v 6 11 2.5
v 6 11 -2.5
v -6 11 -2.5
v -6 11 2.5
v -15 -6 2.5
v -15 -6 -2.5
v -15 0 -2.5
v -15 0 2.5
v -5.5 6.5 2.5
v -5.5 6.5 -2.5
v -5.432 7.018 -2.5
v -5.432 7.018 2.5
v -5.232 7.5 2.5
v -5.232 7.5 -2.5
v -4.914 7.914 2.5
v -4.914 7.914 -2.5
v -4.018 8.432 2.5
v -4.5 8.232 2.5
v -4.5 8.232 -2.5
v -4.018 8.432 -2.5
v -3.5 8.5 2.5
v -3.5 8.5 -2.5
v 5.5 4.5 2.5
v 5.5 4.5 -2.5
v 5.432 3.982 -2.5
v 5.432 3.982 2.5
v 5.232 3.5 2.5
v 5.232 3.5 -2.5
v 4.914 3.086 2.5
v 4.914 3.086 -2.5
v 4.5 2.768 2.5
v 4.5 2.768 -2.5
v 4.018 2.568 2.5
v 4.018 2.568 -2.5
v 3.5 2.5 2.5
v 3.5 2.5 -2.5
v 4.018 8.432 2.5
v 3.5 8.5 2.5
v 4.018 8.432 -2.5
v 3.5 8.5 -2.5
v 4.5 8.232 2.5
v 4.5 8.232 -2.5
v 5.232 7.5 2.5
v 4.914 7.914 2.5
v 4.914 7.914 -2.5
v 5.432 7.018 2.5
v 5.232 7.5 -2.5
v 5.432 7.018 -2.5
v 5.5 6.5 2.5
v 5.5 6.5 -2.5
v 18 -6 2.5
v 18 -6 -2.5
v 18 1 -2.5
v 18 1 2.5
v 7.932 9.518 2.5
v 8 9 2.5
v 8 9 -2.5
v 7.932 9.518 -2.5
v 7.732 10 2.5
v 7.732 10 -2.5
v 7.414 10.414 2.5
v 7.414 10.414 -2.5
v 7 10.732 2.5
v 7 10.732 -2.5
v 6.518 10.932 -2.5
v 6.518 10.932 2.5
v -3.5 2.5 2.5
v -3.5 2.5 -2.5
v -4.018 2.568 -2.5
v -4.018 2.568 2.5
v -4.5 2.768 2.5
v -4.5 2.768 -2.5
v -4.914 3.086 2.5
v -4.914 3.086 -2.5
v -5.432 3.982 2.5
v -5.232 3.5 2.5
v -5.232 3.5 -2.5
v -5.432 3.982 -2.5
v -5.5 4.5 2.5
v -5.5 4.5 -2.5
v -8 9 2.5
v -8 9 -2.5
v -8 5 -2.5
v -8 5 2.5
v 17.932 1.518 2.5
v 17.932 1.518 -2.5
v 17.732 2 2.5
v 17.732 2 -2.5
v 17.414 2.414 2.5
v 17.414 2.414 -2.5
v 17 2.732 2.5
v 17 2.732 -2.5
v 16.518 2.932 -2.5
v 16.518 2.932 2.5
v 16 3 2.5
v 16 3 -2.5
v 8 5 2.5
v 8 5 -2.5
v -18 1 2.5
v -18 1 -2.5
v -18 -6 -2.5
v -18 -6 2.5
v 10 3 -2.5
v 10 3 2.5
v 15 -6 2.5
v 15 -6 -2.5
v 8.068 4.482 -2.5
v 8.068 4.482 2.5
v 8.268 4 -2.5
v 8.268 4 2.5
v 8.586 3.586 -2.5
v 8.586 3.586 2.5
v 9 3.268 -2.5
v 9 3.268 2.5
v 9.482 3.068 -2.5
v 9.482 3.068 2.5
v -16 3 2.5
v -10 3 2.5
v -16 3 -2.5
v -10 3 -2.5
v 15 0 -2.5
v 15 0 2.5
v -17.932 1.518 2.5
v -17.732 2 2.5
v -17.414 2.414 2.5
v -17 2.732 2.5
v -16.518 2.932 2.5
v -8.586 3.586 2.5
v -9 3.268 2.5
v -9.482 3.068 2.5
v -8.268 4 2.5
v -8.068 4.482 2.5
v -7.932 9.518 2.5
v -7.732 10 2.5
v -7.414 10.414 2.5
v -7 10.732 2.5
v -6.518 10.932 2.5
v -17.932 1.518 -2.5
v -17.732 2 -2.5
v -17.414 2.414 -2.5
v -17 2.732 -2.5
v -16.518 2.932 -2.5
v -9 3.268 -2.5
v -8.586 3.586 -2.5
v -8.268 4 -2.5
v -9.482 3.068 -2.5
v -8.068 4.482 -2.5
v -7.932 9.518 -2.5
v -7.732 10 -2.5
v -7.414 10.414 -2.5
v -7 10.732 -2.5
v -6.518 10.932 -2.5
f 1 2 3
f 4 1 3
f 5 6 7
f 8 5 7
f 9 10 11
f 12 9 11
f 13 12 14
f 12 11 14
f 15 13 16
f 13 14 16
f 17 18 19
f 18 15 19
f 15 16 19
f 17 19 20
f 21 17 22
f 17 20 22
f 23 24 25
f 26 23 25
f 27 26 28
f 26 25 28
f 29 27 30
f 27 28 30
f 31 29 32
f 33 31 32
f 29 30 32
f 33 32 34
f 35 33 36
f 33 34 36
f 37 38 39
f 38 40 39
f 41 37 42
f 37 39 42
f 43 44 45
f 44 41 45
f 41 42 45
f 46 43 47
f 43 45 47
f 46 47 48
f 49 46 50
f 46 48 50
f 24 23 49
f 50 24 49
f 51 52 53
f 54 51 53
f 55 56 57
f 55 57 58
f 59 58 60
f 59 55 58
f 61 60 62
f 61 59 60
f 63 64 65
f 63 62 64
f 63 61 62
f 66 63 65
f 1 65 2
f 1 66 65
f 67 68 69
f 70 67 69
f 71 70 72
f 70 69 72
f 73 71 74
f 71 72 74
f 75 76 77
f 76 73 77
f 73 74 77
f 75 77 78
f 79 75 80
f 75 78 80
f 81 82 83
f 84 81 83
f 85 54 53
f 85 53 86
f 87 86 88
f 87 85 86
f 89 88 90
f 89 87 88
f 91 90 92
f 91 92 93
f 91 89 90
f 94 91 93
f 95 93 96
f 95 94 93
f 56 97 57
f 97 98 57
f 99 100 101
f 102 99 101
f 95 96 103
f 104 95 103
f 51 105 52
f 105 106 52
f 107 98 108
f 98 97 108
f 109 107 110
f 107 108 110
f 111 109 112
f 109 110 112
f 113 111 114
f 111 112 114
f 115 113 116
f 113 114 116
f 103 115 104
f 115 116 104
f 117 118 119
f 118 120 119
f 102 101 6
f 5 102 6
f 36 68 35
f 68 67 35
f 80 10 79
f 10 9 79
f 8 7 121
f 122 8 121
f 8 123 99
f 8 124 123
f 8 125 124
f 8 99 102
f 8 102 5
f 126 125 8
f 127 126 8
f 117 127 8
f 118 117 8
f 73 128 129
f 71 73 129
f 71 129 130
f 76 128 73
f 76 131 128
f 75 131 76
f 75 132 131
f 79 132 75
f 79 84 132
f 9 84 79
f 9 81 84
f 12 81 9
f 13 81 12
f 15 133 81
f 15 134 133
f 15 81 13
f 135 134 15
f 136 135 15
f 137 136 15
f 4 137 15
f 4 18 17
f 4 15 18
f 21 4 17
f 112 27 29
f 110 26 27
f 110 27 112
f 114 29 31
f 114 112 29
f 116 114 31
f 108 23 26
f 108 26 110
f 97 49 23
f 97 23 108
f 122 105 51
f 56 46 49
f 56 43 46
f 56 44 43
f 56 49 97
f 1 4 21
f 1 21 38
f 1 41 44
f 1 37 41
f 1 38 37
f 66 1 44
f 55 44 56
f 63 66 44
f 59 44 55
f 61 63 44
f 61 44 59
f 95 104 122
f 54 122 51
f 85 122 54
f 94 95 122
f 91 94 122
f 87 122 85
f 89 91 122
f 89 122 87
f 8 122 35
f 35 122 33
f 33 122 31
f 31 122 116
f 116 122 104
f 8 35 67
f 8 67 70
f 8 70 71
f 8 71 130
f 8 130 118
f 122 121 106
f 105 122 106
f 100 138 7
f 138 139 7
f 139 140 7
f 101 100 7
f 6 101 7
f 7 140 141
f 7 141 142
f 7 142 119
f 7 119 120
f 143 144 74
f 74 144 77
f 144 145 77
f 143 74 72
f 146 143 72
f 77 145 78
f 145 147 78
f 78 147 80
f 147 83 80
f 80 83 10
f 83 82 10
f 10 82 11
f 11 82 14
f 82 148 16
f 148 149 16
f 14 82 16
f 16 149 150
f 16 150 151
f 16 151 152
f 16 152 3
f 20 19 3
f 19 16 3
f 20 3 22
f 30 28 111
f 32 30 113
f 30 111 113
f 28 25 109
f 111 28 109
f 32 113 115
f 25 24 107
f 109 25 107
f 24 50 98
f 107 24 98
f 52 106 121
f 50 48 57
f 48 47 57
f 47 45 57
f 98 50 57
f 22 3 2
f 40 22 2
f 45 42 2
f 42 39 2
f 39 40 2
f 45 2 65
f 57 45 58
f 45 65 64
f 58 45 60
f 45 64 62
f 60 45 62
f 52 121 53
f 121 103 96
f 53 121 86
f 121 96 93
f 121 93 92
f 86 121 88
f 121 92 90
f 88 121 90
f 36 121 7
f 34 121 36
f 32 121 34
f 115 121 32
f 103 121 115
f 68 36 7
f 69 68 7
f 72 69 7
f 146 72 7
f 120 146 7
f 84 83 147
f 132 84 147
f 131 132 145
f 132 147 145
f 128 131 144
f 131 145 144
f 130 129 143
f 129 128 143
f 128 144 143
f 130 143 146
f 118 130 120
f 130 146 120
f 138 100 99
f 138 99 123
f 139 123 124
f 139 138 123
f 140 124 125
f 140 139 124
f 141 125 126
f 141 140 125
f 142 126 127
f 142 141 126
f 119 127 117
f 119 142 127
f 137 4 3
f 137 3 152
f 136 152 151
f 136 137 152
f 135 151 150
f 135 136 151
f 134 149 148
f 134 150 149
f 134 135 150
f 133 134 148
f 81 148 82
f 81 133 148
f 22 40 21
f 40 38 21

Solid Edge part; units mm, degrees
sketch "Sketch1" plane through (0, 0, 0) normal (0, 0, 1) x (1, 0, 0)
  line L0 (-18, -6) -> (-15, -6)
  line L1 (-15, -6) -> (-15, 0)
  line L2 (-15, 0) -> (15, 0)
  line L3 (15, 0) -> (15, -6)
  line L4 (15, -6) -> (18, -6)
  line L5 (18, -6) -> (18, 3)
  line L6 (18, 3) -> (8, 3)
  line L7 (8, 3) -> (8, 11)
  line L8 (8, 11) -> (-8, 11)
  line L9 (-8, 11) -> (-8, 3)
  line L10 (-8, 3) -> (-18, 3)
  line L11 (-18, 3) -> (-18, -6)
  dimension "D1" = 3
  dimension "D2" = 30
  dimension "D3" = 16
  dimension "D4" = 6
  dimension "D5" = 3
  dimension "D6" = 8
extrude "Protrusion1" add sketch "Sketch1" along normal mid plane 5
sketch "Sketch2" plane through (0, 4.5, 2.5) normal (0, 0, 1) x (0, 1, 0)
  line L0 (-2, -5.5) -> (4, -5.5)
  line L1 (4, -5.5) -> (4, 5.5)
  line L2 (4, 5.5) -> (-2, 5.5)
  line L3 (-2, 5.5) -> (-2, -5.5)
  dimension "D1" = 2.5
  dimension "D2" = 2.5
  dimension "D3" = 6
extrude "Cutout1" cut sketch "Sketch2" against normal up to next
fillet "main_rounds" radius 2 10 edges at (8, 3, 0) (8, 11, 0) (5.5, 2.5, 0) (5.5, 8.5, 0) (-5.5, 8.5, 0) (-5.5, 2.5, 0) (-8, 3, 0) (-8, 11, 0) (-18, 3, 0) (18, 3, 0)
properties material "Polyethylene, low density"
